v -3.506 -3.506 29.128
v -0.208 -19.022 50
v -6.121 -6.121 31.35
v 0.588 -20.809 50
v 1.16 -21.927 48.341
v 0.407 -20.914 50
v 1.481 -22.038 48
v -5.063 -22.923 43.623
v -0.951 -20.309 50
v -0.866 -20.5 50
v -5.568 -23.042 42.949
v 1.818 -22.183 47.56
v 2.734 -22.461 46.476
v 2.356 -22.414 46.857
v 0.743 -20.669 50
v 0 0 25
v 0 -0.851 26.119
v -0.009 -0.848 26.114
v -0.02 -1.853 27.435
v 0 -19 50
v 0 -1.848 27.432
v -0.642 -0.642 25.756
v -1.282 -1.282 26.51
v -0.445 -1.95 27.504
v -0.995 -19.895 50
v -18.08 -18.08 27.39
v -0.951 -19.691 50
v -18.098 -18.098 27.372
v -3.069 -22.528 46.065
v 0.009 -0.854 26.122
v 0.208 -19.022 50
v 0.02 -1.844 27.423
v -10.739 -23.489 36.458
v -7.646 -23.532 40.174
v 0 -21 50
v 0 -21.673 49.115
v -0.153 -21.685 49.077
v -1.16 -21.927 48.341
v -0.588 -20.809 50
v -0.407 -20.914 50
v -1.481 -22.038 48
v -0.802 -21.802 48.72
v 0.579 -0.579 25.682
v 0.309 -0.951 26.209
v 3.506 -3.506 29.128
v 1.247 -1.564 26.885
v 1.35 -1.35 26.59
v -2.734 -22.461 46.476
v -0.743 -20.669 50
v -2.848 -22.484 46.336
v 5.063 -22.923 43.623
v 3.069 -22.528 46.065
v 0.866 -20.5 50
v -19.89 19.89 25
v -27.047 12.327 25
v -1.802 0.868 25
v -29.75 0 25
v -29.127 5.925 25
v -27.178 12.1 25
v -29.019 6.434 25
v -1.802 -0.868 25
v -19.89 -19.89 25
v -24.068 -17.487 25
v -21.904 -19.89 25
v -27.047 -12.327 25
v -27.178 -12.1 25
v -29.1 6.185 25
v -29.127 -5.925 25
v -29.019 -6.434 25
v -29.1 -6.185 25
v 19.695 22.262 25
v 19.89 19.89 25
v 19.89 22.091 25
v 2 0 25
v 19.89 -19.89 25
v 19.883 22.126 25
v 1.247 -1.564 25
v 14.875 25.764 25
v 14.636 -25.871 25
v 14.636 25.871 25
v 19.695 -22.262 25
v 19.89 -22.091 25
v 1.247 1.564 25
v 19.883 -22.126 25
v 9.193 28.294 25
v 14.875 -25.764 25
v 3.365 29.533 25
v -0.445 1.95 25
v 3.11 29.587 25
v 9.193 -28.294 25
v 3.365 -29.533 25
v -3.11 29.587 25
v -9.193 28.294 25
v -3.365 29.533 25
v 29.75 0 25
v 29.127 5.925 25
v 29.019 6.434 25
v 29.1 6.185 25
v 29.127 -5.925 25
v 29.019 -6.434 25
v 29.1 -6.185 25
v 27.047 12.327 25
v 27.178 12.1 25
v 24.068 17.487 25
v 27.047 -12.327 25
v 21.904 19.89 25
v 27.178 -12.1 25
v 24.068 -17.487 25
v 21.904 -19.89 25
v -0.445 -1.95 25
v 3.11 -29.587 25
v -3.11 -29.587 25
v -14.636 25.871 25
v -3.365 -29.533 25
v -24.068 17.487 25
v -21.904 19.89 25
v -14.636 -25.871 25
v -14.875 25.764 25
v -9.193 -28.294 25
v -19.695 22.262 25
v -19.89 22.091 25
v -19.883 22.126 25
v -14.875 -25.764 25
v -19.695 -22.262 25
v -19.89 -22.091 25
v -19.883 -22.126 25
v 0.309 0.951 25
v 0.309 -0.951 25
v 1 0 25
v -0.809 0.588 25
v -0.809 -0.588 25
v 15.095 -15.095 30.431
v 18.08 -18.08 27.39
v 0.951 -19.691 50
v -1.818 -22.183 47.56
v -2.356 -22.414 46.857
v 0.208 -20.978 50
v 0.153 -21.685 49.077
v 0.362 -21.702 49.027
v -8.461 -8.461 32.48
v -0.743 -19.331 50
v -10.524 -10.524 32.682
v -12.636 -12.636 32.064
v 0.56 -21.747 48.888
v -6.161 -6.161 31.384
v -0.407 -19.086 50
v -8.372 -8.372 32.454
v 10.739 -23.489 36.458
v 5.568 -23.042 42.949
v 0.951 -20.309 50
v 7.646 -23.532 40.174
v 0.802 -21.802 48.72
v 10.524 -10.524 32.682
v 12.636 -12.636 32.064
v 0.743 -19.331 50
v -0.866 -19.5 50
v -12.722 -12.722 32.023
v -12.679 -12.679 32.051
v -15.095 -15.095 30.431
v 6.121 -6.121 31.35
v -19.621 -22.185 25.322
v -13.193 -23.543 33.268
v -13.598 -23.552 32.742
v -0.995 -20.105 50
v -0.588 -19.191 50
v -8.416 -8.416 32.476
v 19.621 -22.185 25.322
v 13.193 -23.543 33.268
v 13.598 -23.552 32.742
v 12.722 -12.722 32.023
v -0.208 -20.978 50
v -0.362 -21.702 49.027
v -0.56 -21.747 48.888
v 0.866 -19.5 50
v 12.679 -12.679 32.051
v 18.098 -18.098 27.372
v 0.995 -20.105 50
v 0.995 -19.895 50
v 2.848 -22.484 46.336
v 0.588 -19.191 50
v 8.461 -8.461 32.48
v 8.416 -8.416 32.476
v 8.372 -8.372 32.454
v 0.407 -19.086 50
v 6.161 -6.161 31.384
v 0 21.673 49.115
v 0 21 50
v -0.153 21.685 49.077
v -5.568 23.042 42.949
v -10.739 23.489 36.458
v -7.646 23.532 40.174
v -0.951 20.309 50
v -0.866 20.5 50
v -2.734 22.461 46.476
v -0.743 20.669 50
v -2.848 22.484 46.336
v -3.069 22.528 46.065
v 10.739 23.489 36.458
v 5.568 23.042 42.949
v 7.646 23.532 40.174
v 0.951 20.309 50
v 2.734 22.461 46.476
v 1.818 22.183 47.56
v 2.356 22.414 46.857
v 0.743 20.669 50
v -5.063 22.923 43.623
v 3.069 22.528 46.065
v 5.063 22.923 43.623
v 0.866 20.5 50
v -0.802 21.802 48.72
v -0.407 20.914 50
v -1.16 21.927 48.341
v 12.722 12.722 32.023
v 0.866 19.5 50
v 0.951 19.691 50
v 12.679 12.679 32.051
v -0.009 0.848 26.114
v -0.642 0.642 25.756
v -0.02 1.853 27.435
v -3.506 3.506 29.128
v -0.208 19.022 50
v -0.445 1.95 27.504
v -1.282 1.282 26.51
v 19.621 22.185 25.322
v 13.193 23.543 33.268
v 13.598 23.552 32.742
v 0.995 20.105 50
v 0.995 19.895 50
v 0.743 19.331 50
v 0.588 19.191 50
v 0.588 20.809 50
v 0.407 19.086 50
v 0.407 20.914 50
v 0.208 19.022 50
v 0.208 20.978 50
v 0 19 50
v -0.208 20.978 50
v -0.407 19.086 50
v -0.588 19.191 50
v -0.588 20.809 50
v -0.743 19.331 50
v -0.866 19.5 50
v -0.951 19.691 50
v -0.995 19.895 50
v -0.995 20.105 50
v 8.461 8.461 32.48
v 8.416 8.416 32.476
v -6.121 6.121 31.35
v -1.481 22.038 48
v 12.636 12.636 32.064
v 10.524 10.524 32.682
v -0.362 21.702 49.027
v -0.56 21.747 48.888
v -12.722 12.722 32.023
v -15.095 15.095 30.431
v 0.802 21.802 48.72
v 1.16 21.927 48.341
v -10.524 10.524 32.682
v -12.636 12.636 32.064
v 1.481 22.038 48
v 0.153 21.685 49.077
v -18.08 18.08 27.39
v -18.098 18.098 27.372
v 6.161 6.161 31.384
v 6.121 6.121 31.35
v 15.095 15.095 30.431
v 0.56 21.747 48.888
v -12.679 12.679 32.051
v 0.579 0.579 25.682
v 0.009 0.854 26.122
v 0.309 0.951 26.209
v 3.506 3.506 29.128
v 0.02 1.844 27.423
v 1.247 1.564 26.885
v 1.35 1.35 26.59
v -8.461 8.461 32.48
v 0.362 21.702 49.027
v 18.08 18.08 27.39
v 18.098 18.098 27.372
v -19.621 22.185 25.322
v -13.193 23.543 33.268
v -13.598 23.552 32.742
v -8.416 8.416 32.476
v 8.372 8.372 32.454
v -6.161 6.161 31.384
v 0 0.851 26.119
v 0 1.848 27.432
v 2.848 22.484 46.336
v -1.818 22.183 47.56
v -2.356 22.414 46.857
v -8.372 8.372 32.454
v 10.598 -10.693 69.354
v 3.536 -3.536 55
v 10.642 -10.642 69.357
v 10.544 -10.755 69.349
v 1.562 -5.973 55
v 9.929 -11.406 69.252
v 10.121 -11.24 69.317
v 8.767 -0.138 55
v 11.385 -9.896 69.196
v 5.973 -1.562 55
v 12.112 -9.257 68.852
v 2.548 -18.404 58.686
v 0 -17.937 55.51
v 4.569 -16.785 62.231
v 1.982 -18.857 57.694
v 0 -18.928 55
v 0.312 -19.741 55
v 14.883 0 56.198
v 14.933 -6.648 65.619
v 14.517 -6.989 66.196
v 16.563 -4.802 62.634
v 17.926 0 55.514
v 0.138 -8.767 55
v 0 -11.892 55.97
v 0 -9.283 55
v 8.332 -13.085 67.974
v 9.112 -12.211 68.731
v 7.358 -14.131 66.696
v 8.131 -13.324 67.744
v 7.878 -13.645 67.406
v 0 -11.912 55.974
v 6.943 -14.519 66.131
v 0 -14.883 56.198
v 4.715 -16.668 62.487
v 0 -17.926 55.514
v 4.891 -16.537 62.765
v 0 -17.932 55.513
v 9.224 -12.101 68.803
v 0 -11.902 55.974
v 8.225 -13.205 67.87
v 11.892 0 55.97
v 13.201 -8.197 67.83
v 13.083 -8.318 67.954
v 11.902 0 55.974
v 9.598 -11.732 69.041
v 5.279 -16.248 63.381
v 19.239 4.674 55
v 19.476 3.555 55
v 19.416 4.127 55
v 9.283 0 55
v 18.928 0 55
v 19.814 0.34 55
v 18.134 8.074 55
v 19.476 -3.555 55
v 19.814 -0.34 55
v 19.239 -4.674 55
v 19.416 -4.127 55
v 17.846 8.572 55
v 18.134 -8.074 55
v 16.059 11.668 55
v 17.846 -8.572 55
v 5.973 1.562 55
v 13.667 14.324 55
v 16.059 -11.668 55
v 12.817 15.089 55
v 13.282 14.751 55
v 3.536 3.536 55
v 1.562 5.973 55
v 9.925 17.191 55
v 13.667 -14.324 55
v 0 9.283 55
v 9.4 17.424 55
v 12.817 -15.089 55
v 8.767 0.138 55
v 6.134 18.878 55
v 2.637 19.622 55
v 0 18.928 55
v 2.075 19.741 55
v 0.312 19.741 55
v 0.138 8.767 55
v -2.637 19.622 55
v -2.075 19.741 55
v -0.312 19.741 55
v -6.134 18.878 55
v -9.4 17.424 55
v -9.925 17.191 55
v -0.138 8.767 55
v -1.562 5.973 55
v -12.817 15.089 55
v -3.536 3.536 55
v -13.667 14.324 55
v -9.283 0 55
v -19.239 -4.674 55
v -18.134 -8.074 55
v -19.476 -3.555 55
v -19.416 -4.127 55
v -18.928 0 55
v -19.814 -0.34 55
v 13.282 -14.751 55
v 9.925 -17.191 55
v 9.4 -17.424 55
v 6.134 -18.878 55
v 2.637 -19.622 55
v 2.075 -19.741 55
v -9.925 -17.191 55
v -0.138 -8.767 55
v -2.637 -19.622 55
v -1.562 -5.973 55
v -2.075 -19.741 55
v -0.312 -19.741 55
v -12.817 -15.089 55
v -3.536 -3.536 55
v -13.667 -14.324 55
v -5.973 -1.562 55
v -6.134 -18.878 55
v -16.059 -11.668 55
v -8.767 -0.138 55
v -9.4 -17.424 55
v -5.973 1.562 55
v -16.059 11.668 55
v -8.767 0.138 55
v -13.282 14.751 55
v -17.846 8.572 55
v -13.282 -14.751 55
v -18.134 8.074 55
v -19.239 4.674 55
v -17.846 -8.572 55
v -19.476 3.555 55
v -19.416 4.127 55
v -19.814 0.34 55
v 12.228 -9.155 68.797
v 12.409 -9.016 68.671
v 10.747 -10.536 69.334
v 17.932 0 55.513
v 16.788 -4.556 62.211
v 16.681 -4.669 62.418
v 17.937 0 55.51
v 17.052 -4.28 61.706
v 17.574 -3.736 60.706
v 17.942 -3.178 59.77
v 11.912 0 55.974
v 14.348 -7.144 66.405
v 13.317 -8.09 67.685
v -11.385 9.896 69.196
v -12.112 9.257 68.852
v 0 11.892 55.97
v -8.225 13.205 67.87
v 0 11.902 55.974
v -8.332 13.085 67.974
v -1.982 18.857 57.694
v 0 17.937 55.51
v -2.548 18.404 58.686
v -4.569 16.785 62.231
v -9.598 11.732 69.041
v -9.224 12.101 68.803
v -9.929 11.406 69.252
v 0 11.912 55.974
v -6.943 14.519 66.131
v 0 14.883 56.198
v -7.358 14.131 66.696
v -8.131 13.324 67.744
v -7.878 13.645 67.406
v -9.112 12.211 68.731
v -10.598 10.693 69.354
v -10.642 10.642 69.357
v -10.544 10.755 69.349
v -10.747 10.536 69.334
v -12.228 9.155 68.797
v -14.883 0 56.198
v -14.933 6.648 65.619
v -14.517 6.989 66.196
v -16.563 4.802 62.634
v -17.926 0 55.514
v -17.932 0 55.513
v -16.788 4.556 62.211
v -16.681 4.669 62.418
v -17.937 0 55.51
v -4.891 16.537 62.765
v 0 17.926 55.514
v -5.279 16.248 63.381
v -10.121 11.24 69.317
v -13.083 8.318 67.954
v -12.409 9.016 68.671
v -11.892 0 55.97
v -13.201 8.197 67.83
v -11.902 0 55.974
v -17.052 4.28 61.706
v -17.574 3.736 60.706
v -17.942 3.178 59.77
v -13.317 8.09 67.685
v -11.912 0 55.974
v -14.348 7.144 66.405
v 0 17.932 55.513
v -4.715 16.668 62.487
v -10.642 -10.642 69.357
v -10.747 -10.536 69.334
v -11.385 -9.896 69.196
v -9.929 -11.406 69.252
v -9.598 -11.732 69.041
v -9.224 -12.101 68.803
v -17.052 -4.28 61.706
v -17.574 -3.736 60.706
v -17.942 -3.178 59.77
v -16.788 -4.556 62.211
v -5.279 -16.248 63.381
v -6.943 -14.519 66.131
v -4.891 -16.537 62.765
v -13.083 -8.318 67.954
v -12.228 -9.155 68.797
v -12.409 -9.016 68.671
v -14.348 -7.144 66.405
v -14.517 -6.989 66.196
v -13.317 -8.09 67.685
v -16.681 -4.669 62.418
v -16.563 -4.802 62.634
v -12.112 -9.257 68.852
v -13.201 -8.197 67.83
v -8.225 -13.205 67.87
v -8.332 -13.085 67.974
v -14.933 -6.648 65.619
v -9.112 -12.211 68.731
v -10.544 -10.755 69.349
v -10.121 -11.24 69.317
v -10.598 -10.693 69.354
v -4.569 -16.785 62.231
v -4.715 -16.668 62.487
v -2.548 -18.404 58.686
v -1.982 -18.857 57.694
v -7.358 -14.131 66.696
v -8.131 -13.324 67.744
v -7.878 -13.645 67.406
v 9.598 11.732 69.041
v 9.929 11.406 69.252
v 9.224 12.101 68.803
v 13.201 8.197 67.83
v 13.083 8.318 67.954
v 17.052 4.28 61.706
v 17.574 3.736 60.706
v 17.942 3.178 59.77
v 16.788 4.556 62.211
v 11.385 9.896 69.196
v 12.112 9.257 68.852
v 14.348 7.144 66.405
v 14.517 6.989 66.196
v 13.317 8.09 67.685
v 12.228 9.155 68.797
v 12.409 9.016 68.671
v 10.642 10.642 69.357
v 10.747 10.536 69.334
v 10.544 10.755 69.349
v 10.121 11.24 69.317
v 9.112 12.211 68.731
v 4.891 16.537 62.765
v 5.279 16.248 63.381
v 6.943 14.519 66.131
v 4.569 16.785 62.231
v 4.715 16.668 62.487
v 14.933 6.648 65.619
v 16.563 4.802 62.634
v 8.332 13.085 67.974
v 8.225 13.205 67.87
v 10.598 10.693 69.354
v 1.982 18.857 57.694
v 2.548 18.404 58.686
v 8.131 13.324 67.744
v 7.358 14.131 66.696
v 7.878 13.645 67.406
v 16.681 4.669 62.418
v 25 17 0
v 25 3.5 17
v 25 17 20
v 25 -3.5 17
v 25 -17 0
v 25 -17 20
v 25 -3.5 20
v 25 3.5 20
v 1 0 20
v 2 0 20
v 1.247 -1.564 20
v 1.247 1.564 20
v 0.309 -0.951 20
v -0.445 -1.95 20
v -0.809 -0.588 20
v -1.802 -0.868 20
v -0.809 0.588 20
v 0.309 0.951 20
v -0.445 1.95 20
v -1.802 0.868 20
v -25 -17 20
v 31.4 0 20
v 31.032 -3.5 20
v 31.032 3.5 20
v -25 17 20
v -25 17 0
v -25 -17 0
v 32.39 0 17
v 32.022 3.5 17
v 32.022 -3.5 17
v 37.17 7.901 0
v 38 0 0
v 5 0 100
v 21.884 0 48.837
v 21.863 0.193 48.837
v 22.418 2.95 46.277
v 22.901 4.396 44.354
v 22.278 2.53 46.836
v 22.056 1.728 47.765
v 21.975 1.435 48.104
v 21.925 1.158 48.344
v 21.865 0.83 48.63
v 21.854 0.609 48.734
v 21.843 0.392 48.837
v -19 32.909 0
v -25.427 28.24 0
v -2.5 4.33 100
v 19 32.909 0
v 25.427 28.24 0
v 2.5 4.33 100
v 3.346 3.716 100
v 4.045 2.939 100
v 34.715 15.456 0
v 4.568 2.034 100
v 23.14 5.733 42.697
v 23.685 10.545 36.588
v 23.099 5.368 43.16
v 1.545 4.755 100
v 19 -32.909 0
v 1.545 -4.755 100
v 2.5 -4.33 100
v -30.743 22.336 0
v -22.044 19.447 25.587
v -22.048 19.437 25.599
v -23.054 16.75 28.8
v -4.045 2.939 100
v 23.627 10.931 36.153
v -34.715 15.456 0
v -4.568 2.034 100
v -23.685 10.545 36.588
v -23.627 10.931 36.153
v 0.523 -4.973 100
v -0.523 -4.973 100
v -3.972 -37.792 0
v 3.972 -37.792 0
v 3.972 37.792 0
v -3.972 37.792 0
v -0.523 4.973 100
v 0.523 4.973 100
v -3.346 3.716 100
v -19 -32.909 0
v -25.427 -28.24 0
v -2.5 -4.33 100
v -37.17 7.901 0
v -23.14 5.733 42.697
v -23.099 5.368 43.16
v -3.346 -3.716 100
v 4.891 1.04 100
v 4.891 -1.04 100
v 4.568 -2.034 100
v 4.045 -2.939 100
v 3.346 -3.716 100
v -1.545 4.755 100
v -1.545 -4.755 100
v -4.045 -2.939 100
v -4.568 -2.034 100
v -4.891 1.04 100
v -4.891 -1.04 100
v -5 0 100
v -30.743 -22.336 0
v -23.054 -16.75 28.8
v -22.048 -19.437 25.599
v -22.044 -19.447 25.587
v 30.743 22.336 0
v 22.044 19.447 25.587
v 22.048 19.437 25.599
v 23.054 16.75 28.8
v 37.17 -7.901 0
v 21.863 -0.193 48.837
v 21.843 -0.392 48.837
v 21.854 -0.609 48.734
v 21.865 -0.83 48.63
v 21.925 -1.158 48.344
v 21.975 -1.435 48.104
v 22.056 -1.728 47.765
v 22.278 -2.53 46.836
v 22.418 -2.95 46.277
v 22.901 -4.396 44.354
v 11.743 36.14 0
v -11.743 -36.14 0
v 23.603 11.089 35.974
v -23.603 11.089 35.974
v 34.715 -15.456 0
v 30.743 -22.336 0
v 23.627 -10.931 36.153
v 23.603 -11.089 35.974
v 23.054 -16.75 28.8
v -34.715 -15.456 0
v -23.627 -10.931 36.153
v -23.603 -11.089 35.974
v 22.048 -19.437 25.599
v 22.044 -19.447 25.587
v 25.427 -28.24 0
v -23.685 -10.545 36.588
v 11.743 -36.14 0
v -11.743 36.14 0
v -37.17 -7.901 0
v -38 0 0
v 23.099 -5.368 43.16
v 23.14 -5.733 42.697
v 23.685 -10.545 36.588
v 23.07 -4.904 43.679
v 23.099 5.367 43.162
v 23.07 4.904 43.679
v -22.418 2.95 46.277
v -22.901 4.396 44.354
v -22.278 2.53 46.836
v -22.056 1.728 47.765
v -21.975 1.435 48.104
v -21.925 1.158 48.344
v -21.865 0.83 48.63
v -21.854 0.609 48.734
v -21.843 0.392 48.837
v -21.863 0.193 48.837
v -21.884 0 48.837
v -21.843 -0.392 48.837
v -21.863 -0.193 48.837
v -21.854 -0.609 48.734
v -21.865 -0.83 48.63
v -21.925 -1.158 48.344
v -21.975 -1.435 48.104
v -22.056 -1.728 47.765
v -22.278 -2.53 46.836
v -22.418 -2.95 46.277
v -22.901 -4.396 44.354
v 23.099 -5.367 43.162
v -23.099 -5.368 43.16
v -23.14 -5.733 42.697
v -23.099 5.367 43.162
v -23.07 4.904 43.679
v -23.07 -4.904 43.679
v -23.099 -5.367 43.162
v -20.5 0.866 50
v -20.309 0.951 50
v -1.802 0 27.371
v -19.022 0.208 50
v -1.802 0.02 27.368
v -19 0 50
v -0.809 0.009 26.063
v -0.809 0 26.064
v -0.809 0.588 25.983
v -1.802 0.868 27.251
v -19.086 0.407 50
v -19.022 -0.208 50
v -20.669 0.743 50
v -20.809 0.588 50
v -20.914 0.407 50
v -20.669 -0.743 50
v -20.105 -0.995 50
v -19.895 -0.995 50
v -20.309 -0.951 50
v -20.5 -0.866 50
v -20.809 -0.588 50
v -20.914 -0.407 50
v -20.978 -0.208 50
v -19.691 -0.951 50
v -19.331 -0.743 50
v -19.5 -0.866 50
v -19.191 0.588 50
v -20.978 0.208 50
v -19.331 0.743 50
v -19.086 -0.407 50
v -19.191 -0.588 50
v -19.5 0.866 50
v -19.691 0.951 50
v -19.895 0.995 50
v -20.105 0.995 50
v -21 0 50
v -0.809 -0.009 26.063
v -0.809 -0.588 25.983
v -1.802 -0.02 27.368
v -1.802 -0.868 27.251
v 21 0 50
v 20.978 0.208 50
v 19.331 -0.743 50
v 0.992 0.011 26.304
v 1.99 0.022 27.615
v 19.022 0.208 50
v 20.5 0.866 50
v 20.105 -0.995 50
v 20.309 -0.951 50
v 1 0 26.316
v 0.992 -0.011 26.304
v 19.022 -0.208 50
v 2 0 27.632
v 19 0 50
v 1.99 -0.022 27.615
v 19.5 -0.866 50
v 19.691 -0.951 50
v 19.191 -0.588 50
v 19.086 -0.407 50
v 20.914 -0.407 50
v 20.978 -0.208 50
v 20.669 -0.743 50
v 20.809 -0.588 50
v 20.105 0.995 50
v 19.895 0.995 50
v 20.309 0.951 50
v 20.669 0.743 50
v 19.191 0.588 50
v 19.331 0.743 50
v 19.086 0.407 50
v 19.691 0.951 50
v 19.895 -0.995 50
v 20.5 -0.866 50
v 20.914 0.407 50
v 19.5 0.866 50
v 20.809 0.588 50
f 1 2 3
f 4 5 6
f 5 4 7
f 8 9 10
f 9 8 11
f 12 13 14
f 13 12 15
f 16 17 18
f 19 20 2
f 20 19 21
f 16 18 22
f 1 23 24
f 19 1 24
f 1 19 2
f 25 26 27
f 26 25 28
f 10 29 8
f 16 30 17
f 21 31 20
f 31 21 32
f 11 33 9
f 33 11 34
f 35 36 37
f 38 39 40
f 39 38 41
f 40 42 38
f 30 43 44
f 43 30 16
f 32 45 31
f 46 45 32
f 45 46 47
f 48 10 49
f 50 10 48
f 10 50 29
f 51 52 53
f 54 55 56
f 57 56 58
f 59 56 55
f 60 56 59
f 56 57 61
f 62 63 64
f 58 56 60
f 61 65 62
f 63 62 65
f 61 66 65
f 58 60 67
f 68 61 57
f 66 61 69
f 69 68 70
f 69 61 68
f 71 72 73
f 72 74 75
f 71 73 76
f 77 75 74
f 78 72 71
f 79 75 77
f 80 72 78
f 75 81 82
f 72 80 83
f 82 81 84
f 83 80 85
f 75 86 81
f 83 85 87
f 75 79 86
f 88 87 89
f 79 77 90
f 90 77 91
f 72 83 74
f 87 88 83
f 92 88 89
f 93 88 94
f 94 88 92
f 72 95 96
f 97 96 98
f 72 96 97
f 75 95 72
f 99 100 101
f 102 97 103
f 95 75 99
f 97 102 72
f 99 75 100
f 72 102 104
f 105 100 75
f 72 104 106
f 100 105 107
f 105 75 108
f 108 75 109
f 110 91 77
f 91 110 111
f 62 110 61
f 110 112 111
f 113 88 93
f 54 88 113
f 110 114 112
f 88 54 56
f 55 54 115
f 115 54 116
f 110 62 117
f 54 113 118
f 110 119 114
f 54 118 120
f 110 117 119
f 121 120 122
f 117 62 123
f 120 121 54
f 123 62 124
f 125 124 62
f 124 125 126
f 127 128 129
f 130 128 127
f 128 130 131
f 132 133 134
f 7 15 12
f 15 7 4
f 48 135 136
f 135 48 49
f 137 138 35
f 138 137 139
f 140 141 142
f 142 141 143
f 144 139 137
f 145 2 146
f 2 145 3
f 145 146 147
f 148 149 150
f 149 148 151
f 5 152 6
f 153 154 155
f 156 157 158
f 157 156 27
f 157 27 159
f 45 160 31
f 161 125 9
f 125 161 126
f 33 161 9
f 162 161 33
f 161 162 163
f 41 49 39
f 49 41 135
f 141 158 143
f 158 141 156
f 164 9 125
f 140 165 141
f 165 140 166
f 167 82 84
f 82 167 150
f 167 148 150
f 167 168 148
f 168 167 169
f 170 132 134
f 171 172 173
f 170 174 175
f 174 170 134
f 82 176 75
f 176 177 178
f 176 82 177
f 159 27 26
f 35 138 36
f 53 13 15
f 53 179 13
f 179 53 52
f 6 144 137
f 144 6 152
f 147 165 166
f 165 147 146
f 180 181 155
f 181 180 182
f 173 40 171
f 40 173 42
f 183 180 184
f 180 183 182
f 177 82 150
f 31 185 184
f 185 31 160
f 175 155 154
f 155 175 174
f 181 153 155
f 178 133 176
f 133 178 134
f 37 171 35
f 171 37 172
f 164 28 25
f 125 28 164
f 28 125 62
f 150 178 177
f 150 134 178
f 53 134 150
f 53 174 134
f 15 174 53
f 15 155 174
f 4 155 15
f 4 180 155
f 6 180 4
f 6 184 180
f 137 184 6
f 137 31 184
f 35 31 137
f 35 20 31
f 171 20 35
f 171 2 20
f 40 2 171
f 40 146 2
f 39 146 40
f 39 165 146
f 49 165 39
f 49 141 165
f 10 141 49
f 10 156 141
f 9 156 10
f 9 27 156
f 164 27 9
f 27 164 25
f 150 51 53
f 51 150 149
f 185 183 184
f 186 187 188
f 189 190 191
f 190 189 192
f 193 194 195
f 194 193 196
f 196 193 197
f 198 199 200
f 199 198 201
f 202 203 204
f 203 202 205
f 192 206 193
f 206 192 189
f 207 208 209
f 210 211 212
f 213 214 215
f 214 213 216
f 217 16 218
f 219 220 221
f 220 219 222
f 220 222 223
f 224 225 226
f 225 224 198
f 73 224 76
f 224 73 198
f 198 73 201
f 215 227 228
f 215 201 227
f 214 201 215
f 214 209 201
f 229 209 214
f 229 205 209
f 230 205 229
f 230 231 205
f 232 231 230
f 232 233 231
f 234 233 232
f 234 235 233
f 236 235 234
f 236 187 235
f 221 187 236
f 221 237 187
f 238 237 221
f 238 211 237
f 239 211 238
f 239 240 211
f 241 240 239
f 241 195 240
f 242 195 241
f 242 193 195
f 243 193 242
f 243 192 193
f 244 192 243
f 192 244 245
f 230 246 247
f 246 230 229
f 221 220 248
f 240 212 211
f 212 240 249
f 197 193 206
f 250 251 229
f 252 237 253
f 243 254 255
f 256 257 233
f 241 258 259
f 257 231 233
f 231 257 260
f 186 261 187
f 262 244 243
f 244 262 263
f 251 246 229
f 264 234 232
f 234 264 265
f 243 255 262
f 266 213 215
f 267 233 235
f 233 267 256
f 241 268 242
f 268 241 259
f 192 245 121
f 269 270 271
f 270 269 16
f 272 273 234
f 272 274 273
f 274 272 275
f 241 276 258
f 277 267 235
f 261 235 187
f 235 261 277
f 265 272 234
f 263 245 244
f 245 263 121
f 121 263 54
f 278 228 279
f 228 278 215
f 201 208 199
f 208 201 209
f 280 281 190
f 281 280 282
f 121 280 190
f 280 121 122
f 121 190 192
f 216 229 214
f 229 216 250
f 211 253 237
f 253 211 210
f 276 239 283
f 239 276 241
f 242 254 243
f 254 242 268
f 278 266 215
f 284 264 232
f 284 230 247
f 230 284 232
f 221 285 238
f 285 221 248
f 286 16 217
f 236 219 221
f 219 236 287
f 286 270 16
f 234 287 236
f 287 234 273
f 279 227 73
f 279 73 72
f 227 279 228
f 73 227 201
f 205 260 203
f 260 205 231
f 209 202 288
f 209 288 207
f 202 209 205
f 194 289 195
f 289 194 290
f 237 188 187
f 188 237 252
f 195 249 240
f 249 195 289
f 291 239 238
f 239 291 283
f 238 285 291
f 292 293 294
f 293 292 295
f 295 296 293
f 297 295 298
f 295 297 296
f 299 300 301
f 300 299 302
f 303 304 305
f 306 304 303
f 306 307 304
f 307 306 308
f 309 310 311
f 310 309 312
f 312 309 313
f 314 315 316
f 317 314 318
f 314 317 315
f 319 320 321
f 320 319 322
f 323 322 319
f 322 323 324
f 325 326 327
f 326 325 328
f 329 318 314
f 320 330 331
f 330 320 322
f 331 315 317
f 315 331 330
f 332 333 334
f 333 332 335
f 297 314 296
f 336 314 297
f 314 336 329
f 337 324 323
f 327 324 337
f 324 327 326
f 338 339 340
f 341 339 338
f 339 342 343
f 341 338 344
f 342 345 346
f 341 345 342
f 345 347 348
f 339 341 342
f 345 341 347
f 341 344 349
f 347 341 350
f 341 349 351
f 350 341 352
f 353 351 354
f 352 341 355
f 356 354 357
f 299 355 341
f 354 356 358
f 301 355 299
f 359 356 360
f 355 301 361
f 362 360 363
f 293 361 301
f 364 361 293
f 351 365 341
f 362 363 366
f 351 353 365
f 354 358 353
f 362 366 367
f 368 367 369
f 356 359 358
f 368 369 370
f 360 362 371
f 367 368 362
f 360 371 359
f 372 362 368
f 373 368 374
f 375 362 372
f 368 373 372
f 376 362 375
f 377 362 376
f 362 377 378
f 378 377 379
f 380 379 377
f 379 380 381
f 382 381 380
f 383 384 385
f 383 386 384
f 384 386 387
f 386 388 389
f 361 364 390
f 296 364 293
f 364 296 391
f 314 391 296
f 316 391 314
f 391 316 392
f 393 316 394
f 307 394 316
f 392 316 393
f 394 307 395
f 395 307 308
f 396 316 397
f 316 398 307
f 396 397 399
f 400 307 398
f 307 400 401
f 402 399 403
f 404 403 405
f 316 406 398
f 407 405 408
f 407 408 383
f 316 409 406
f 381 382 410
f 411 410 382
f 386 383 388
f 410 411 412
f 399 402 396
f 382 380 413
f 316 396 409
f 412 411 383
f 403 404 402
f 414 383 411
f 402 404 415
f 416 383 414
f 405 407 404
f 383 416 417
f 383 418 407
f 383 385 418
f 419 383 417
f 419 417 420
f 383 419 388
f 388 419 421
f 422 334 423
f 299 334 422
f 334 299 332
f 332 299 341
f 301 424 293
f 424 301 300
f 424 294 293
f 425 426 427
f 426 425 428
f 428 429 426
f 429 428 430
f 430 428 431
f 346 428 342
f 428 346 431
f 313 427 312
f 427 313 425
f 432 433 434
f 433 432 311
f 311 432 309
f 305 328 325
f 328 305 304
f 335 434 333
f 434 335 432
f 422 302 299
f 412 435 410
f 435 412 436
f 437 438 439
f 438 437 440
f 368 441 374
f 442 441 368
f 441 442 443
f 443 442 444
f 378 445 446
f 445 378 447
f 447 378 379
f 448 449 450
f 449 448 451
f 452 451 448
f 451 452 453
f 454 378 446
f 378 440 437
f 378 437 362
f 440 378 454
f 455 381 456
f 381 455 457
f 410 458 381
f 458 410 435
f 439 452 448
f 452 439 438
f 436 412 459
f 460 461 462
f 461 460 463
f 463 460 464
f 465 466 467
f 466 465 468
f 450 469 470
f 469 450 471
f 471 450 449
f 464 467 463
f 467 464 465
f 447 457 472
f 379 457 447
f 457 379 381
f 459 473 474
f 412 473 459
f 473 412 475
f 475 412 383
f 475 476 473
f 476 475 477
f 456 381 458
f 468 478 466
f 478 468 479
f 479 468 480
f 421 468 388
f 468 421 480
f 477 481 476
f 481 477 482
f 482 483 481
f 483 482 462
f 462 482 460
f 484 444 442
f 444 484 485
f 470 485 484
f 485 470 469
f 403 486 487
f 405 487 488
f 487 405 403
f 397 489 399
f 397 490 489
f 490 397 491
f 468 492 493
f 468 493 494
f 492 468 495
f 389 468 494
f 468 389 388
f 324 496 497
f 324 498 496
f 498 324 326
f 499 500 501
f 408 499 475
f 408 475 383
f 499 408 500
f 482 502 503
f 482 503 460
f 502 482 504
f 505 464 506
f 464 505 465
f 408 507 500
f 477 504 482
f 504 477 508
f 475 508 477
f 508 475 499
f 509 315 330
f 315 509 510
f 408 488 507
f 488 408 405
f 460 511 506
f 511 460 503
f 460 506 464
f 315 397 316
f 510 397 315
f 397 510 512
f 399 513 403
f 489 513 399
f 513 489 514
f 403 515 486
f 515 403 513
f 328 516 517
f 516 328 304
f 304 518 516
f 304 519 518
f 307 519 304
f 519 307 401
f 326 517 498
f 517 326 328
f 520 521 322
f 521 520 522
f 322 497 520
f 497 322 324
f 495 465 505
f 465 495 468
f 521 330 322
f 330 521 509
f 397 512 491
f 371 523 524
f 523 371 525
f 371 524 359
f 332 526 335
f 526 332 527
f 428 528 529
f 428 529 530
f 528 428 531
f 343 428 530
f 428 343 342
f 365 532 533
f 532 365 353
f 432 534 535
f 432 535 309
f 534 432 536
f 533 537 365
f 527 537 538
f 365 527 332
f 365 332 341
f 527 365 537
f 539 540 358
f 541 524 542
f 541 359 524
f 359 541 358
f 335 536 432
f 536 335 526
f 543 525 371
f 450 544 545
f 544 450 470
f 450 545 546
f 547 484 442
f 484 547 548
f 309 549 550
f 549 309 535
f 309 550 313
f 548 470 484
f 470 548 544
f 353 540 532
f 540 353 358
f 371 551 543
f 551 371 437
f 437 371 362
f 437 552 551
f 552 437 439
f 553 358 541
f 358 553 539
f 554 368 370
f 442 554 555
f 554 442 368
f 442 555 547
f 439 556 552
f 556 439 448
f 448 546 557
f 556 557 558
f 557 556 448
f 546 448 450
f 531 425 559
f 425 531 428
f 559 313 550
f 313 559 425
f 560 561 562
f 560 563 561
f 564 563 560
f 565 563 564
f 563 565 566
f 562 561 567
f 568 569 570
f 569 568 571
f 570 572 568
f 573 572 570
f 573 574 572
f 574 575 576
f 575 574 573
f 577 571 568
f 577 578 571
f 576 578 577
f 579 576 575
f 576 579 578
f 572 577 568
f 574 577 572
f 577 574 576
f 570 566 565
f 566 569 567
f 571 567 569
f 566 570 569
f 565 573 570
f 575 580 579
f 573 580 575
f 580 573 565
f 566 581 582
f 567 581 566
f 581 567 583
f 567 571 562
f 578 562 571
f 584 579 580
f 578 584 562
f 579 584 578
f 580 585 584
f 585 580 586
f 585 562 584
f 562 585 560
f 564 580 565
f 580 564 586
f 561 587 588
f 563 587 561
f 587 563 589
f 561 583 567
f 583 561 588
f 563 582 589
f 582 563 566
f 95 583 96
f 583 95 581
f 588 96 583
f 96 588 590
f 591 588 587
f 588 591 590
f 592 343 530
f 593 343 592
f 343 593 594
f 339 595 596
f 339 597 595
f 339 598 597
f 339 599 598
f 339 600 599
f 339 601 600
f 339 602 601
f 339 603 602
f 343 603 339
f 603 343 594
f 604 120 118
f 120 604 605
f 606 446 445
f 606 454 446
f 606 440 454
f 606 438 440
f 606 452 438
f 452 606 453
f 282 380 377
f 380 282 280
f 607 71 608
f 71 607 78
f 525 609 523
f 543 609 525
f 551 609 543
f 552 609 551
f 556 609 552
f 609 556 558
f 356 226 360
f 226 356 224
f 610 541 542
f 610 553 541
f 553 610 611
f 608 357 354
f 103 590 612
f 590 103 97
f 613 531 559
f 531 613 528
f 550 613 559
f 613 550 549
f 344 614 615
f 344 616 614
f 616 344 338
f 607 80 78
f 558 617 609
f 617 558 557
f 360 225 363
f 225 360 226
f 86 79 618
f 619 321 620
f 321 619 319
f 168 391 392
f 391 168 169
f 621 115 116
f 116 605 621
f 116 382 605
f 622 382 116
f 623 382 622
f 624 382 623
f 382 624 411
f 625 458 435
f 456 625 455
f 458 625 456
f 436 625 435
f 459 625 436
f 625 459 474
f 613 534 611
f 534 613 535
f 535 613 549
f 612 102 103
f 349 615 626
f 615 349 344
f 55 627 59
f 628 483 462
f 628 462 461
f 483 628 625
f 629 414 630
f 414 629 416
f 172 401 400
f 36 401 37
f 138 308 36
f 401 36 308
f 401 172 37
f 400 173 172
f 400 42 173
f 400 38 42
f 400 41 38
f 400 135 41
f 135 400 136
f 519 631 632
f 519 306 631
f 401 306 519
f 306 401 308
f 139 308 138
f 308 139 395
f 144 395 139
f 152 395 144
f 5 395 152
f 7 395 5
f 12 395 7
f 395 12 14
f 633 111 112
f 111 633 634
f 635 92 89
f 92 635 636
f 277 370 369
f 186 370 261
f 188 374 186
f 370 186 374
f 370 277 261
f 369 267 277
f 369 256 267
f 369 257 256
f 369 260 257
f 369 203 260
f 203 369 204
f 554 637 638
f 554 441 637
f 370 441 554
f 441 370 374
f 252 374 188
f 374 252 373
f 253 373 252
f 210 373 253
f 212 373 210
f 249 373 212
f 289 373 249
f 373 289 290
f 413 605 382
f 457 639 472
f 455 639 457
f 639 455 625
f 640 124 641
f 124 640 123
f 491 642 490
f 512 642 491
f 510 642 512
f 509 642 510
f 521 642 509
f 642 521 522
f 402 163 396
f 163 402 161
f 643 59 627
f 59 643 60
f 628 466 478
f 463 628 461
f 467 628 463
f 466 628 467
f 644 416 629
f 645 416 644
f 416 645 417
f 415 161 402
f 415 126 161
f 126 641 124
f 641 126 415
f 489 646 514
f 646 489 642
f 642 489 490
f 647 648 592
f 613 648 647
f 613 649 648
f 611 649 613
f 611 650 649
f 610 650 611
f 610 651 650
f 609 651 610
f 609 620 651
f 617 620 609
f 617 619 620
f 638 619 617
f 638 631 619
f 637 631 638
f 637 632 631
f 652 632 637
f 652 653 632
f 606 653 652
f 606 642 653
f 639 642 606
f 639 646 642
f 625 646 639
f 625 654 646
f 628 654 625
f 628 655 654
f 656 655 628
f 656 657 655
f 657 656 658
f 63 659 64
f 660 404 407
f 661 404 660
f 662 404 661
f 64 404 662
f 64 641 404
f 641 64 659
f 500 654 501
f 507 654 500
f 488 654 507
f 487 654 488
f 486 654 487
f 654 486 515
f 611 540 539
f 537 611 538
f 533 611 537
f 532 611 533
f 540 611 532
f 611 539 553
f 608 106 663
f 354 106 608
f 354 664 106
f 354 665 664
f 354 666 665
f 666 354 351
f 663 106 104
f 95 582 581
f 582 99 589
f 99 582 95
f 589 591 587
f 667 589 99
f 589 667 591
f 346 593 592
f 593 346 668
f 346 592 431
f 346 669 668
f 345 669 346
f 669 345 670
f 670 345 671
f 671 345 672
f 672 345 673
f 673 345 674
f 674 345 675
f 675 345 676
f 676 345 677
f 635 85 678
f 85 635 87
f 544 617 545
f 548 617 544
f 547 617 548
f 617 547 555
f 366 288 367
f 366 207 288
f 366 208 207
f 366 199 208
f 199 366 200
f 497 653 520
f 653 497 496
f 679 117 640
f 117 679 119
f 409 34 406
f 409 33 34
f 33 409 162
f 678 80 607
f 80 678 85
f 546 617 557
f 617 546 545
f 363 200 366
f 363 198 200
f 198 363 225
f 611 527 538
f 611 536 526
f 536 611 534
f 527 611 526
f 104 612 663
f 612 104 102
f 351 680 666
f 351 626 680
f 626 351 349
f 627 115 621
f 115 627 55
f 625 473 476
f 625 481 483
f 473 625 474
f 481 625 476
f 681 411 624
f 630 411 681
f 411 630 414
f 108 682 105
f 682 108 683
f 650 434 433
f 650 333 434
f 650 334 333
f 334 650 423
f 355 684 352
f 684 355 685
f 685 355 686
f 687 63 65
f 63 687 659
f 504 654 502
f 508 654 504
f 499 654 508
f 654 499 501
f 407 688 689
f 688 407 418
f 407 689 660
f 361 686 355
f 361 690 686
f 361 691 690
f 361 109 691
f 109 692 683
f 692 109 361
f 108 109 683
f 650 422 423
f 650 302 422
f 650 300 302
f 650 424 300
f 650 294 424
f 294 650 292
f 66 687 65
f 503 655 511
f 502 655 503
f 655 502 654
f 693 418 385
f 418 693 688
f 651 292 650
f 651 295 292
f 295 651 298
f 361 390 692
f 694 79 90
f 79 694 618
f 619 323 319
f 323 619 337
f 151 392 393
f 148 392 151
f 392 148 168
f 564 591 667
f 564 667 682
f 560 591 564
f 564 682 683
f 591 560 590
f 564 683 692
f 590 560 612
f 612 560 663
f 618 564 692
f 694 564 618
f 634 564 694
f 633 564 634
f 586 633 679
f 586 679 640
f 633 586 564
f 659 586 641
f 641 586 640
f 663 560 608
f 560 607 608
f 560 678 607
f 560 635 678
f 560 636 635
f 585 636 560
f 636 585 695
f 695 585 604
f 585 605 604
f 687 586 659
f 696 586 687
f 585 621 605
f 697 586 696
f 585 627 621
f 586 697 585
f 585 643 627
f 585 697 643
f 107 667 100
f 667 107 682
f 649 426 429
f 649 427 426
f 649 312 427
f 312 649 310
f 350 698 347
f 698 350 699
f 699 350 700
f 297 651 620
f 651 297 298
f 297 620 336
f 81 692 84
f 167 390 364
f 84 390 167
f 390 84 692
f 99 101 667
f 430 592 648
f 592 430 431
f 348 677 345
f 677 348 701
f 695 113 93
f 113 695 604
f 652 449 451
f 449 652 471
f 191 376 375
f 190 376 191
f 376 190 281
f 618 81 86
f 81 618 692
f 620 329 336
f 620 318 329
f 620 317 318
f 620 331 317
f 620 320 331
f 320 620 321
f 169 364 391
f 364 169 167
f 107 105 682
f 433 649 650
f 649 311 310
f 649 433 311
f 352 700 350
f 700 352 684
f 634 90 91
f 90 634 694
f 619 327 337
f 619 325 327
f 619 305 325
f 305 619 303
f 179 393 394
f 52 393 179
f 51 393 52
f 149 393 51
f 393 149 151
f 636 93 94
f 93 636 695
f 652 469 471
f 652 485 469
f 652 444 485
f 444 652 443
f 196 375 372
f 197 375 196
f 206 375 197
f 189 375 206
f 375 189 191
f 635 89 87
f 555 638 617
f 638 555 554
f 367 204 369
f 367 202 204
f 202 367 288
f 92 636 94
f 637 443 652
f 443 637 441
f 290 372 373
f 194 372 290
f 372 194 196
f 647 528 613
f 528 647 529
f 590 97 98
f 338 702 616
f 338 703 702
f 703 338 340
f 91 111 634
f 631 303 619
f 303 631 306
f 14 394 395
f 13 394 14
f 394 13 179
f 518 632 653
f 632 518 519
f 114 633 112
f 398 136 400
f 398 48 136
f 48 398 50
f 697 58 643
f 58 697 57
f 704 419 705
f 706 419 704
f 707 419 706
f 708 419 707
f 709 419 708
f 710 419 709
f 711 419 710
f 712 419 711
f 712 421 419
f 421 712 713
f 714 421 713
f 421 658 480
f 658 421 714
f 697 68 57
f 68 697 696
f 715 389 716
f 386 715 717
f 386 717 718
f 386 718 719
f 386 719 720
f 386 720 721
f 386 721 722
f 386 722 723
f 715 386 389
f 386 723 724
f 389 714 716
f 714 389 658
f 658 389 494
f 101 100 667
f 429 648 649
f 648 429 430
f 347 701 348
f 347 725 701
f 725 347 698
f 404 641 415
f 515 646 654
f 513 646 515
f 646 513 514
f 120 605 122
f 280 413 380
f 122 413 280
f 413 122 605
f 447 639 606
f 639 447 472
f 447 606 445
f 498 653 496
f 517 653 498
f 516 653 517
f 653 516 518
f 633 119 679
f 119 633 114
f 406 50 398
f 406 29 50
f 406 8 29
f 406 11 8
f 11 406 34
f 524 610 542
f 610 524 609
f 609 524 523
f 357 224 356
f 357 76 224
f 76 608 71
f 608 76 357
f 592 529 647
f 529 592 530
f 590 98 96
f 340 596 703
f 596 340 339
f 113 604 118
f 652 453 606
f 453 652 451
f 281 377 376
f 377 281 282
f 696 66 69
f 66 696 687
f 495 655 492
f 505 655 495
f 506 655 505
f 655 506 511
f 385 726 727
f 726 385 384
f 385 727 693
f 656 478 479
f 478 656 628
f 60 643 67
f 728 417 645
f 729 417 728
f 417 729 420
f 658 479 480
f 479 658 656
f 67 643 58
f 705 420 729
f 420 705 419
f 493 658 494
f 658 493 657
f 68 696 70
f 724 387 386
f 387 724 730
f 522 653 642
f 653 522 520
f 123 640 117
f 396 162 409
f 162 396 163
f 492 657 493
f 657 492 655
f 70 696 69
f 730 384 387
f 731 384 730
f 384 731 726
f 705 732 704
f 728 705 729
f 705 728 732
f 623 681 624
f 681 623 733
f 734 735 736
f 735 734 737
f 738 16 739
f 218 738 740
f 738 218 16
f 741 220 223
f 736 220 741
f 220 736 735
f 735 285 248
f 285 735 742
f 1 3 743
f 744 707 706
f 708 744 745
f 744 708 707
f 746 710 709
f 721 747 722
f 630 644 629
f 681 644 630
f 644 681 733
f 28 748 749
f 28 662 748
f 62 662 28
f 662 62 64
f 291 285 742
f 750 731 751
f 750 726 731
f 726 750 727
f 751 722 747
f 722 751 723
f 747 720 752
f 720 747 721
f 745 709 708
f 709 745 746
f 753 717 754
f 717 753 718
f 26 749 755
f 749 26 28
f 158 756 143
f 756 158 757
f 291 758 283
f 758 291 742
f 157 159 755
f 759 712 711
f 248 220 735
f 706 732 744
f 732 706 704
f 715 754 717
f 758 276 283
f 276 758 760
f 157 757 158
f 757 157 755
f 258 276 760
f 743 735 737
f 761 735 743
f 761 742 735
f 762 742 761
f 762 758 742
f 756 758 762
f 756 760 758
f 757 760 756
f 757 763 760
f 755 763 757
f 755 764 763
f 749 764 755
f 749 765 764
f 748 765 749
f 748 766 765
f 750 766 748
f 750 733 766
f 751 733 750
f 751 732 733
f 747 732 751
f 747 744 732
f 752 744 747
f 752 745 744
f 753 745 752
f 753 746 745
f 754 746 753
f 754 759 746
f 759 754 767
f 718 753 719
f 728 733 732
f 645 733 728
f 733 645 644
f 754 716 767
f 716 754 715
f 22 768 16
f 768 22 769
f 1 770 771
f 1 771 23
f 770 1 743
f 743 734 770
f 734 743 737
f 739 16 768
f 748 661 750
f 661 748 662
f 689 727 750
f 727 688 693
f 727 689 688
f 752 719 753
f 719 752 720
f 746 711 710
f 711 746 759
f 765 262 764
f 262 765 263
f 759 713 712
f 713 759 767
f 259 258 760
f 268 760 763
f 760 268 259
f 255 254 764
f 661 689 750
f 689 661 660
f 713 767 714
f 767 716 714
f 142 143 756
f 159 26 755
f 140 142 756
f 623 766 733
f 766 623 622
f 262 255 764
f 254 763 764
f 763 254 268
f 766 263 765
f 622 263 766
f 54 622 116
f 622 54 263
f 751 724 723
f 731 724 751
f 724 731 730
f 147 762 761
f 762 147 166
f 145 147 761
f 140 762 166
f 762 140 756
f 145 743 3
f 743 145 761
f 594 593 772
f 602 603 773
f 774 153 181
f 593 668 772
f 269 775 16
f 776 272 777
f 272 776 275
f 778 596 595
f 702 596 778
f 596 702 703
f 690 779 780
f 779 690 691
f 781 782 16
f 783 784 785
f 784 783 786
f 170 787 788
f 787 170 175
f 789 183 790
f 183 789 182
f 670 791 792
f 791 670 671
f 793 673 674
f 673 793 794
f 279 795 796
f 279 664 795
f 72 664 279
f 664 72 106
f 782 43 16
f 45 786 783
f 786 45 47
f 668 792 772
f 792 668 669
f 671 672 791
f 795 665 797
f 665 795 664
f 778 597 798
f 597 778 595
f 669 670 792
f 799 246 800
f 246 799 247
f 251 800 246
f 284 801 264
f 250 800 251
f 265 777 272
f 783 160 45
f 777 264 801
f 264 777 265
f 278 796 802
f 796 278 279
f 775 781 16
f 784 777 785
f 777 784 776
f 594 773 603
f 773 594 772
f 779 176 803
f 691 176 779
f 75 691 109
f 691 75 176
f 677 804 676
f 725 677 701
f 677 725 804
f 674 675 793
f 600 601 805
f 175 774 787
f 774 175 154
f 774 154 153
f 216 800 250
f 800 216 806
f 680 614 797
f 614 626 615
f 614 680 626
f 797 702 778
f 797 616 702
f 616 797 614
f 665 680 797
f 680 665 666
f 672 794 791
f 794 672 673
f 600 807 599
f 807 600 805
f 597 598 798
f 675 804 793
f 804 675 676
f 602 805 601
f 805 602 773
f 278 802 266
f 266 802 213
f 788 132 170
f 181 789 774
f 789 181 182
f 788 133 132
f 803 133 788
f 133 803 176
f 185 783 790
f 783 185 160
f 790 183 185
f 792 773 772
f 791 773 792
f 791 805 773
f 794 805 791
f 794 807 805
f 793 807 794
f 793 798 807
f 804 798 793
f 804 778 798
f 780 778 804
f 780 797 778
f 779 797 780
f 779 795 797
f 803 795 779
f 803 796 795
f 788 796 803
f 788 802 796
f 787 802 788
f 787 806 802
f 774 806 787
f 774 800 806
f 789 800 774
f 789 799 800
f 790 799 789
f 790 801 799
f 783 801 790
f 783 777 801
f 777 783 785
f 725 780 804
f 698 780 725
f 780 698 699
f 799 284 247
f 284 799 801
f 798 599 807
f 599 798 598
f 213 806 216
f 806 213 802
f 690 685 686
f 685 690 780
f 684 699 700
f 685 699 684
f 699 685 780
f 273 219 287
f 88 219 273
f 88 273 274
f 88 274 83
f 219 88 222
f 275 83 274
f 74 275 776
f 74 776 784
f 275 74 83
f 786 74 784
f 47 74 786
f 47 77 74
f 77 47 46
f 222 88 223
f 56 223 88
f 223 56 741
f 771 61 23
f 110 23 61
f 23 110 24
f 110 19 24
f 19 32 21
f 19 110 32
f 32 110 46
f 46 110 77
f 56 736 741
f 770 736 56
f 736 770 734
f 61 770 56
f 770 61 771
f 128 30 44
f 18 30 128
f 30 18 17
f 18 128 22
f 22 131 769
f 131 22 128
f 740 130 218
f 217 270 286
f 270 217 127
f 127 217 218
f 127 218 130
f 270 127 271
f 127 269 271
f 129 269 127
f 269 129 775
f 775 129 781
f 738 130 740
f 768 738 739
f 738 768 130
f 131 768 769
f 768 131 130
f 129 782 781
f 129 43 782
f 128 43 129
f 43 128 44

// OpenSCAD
//!OpenSCAD
first_floor_base = 20;
first_floor_height = 25;

second_floor_base = 15;
second_floor_height = 20;
second_floor_orbit = 20;

difference(){

	union(){

		// body
		cylinder(r1=38,r2=5,h=100);

	}

	// cut-outs

	// first floor
	translate([-20,0,25]){
		cylinder(r1=first_floor_base,r2=1,h=first_floor_height);
	}

	translate([20,0,25]){
		cylinder(r1=first_floor_base,r2=1,h=first_floor_height);
	}

	rotate([0,0,90]){
		translate([-20,0,25]){
			cylinder(r1=first_floor_base,r2=1,h=first_floor_height);
		}

		translate([20,0,25]){
			cylinder(r1=first_floor_base,r2=1,h=first_floor_height);
		}
	}

		// second floor
		rotate([0,0,45]){
		translate([-second_floor_orbit,0,55]){
			cylinder(r1=second_floor_base,r2=1,h=second_floor_height);
		}

		translate([second_floor_orbit,0,55]){
			cylinder(r1=second_floor_base,r2=1,h=second_floor_height);
		}

		rotate([0,0,90]){
			translate([-second_floor_orbit,0,55]){
			cylinder(r1=second_floor_base,r2=1,h=second_floor_height);
			}

			translate([second_floor_orbit,0,55]){
				cylinder(r1=second_floor_base
                ,r2=1,h=second_floor_height);
			}
		}
	}
	/*
	translate([-13,-50,25]){
		cube([26,100,10]);
	}
	rotate([0,0,90]){
		translate([-13,-50,25]){
			cube([26,100,10]);
		}
	}
	*/

	// breadboard bounding box
	translate([-25,-17,0]){
		union(){
			translate([0,0,-1]){
				cube([50,34,21]);
			}
			translate([48,13.5,17]){
				cube([10,7,3]);
			}
		}
	}
}

// sensor wire channel
difference(){

	translate([0,0,20]){

		// sensor wire tube
		cylinder(r=2,h=80);
	}

	// sensor wire hole
	cylinder(r=1,h=110);
	
}
